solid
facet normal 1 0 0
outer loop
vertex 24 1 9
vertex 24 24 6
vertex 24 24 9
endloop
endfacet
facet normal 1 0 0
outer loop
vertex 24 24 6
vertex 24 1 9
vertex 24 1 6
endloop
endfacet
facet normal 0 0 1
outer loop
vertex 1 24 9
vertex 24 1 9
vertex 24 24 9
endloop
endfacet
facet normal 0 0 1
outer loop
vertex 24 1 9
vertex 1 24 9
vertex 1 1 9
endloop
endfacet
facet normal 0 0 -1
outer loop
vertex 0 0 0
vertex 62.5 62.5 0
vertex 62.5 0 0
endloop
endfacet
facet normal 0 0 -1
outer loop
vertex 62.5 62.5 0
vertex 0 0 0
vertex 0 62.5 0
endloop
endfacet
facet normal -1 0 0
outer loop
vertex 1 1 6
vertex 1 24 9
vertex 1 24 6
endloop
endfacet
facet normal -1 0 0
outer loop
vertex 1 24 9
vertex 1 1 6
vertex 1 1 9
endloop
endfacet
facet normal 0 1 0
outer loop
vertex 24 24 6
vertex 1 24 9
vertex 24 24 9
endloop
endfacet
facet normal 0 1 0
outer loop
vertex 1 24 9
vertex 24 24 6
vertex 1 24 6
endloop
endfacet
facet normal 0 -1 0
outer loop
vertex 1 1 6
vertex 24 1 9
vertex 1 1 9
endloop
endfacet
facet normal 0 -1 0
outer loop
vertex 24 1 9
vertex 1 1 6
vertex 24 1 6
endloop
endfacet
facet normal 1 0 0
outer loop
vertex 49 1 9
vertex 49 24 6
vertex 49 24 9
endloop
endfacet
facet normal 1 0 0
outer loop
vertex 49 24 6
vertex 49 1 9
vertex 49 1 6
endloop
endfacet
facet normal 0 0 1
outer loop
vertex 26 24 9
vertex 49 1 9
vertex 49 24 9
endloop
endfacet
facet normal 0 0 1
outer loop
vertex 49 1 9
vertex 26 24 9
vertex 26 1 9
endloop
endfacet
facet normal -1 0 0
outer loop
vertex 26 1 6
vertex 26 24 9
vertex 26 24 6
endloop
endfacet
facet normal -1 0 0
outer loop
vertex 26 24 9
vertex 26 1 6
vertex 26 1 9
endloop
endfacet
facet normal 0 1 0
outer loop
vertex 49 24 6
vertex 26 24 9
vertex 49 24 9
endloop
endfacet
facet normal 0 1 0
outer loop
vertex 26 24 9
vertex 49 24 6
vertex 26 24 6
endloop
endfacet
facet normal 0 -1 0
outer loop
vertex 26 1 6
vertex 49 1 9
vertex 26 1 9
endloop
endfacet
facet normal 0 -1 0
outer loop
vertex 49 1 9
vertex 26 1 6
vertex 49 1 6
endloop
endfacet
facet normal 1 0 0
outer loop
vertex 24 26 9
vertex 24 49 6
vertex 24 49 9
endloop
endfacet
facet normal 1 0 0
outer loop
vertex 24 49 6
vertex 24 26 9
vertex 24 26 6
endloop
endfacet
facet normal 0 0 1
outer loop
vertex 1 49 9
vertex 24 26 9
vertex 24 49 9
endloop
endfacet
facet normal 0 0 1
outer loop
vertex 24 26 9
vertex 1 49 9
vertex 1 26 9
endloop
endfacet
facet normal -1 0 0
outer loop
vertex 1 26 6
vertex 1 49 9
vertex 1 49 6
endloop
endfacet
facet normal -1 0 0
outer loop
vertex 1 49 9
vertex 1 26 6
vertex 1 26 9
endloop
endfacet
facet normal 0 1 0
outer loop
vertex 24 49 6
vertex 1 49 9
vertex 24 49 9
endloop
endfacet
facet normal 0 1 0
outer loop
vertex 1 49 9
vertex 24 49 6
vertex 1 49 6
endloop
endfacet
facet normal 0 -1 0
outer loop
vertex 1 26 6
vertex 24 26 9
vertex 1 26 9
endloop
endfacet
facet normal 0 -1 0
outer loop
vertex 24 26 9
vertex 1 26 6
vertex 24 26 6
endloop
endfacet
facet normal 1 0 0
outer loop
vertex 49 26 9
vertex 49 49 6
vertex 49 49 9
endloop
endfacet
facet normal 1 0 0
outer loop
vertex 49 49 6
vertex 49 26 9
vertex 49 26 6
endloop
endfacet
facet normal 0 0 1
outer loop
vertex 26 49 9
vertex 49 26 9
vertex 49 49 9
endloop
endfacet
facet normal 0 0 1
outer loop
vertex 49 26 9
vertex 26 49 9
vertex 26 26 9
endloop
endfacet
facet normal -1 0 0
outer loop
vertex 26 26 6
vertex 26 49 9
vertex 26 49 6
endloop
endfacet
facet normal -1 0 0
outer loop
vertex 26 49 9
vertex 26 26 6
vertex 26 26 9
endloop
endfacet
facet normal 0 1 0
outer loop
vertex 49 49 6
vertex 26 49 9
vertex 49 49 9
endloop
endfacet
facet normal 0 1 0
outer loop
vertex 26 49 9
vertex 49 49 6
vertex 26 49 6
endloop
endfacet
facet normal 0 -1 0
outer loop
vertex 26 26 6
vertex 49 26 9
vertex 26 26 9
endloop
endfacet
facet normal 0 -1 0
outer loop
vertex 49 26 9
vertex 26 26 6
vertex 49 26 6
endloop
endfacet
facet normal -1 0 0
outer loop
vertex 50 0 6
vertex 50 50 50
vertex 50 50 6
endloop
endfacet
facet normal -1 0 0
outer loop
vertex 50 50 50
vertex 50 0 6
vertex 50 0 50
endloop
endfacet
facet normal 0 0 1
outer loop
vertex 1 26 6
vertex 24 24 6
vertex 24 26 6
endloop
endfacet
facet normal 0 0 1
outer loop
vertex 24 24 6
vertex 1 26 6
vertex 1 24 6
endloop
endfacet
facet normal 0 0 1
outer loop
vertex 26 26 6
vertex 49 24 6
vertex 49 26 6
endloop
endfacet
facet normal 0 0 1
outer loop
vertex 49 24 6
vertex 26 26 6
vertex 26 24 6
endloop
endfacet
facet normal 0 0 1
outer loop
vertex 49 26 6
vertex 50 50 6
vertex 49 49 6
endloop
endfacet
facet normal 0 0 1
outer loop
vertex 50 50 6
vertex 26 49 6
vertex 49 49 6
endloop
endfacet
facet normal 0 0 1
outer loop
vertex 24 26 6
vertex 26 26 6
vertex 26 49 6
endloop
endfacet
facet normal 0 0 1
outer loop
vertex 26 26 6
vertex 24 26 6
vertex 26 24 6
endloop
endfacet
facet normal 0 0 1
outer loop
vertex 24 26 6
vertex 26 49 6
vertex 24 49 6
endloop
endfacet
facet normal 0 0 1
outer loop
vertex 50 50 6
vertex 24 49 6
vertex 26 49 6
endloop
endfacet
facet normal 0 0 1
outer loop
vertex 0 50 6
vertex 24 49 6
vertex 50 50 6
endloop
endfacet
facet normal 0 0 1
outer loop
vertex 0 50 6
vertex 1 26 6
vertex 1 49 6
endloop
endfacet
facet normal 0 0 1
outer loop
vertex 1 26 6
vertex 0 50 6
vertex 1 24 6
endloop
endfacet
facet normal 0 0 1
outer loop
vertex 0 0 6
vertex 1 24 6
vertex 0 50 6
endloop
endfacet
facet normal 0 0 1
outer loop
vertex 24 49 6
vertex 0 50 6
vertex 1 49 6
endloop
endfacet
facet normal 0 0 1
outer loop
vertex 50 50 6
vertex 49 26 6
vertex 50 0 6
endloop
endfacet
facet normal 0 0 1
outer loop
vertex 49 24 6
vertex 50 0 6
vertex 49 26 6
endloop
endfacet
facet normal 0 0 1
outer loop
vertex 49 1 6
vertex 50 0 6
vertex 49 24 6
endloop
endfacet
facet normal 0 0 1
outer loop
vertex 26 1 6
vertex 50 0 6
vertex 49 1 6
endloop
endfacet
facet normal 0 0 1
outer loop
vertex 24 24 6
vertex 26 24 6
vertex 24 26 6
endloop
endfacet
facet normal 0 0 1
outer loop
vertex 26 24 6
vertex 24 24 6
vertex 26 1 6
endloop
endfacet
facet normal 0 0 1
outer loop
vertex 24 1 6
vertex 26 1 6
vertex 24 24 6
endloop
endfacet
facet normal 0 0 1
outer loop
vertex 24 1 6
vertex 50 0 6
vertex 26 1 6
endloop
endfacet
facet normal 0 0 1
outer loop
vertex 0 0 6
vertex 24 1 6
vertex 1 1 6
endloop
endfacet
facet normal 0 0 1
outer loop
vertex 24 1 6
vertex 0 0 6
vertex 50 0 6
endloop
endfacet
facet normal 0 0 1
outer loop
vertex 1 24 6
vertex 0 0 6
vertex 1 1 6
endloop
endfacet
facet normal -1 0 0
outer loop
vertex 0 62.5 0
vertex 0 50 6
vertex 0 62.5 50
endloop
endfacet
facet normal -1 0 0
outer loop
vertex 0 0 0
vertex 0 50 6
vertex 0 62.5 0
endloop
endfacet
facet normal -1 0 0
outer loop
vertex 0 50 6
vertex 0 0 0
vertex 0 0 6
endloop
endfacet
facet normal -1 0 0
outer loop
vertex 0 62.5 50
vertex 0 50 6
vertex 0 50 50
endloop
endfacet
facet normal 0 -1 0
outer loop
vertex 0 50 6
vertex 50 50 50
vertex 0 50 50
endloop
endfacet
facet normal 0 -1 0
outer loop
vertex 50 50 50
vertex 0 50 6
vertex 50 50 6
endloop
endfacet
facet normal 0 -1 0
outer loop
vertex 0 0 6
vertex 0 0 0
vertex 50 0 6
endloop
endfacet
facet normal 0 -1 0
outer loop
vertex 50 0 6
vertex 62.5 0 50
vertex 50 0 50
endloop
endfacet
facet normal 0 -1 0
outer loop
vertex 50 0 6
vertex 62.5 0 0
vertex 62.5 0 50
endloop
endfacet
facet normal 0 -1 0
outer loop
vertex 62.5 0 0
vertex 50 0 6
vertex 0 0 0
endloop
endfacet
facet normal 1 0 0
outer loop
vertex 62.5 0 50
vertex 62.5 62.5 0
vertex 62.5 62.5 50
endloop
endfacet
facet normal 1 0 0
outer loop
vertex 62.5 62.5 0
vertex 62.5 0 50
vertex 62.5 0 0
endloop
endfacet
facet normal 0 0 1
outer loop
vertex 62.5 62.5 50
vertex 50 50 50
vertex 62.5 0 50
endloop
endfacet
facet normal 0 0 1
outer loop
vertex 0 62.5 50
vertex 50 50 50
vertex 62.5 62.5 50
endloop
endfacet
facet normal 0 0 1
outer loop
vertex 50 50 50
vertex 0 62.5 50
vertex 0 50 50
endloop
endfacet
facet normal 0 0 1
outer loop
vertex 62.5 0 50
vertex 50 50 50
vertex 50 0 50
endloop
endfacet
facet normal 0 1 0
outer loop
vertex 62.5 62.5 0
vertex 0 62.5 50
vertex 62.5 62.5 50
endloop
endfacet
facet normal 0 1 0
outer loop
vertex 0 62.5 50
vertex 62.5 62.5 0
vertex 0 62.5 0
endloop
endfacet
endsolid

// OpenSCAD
//translate([0,0,0]) color("LightGray") square([25,25],false);
//translate([25,0,0]) color("LightGray") square([25,25],false);
//translate([0,25,0]) color("LightGray") square([25,25],false);
//translate([25,25,0]) color("LightGray") square([25,25],false);

scale([2,2,2]) {
    //translate([0,50,0]) color("Gray") square([50,12.5],false);
    //translate([50,0,0]) color("Gray") square([12.5,50],false);
}

color("LightGray") {
    translate([1,1,0]) cube([23,23,9]);
    translate([25+1,1,0]) cube([23,23,9]);
    translate([1,25+1,0]) cube([23,23,9]);
    translate([25+1,25+1,0]) cube([23,23,9]);
}
color("Grey") {
    cube([50,50,6]);
    translate([0,50,0]) cube([50+12.5,12.5,50]);
    translate([50,0,0]) cube([12.5,50,50]);
}
